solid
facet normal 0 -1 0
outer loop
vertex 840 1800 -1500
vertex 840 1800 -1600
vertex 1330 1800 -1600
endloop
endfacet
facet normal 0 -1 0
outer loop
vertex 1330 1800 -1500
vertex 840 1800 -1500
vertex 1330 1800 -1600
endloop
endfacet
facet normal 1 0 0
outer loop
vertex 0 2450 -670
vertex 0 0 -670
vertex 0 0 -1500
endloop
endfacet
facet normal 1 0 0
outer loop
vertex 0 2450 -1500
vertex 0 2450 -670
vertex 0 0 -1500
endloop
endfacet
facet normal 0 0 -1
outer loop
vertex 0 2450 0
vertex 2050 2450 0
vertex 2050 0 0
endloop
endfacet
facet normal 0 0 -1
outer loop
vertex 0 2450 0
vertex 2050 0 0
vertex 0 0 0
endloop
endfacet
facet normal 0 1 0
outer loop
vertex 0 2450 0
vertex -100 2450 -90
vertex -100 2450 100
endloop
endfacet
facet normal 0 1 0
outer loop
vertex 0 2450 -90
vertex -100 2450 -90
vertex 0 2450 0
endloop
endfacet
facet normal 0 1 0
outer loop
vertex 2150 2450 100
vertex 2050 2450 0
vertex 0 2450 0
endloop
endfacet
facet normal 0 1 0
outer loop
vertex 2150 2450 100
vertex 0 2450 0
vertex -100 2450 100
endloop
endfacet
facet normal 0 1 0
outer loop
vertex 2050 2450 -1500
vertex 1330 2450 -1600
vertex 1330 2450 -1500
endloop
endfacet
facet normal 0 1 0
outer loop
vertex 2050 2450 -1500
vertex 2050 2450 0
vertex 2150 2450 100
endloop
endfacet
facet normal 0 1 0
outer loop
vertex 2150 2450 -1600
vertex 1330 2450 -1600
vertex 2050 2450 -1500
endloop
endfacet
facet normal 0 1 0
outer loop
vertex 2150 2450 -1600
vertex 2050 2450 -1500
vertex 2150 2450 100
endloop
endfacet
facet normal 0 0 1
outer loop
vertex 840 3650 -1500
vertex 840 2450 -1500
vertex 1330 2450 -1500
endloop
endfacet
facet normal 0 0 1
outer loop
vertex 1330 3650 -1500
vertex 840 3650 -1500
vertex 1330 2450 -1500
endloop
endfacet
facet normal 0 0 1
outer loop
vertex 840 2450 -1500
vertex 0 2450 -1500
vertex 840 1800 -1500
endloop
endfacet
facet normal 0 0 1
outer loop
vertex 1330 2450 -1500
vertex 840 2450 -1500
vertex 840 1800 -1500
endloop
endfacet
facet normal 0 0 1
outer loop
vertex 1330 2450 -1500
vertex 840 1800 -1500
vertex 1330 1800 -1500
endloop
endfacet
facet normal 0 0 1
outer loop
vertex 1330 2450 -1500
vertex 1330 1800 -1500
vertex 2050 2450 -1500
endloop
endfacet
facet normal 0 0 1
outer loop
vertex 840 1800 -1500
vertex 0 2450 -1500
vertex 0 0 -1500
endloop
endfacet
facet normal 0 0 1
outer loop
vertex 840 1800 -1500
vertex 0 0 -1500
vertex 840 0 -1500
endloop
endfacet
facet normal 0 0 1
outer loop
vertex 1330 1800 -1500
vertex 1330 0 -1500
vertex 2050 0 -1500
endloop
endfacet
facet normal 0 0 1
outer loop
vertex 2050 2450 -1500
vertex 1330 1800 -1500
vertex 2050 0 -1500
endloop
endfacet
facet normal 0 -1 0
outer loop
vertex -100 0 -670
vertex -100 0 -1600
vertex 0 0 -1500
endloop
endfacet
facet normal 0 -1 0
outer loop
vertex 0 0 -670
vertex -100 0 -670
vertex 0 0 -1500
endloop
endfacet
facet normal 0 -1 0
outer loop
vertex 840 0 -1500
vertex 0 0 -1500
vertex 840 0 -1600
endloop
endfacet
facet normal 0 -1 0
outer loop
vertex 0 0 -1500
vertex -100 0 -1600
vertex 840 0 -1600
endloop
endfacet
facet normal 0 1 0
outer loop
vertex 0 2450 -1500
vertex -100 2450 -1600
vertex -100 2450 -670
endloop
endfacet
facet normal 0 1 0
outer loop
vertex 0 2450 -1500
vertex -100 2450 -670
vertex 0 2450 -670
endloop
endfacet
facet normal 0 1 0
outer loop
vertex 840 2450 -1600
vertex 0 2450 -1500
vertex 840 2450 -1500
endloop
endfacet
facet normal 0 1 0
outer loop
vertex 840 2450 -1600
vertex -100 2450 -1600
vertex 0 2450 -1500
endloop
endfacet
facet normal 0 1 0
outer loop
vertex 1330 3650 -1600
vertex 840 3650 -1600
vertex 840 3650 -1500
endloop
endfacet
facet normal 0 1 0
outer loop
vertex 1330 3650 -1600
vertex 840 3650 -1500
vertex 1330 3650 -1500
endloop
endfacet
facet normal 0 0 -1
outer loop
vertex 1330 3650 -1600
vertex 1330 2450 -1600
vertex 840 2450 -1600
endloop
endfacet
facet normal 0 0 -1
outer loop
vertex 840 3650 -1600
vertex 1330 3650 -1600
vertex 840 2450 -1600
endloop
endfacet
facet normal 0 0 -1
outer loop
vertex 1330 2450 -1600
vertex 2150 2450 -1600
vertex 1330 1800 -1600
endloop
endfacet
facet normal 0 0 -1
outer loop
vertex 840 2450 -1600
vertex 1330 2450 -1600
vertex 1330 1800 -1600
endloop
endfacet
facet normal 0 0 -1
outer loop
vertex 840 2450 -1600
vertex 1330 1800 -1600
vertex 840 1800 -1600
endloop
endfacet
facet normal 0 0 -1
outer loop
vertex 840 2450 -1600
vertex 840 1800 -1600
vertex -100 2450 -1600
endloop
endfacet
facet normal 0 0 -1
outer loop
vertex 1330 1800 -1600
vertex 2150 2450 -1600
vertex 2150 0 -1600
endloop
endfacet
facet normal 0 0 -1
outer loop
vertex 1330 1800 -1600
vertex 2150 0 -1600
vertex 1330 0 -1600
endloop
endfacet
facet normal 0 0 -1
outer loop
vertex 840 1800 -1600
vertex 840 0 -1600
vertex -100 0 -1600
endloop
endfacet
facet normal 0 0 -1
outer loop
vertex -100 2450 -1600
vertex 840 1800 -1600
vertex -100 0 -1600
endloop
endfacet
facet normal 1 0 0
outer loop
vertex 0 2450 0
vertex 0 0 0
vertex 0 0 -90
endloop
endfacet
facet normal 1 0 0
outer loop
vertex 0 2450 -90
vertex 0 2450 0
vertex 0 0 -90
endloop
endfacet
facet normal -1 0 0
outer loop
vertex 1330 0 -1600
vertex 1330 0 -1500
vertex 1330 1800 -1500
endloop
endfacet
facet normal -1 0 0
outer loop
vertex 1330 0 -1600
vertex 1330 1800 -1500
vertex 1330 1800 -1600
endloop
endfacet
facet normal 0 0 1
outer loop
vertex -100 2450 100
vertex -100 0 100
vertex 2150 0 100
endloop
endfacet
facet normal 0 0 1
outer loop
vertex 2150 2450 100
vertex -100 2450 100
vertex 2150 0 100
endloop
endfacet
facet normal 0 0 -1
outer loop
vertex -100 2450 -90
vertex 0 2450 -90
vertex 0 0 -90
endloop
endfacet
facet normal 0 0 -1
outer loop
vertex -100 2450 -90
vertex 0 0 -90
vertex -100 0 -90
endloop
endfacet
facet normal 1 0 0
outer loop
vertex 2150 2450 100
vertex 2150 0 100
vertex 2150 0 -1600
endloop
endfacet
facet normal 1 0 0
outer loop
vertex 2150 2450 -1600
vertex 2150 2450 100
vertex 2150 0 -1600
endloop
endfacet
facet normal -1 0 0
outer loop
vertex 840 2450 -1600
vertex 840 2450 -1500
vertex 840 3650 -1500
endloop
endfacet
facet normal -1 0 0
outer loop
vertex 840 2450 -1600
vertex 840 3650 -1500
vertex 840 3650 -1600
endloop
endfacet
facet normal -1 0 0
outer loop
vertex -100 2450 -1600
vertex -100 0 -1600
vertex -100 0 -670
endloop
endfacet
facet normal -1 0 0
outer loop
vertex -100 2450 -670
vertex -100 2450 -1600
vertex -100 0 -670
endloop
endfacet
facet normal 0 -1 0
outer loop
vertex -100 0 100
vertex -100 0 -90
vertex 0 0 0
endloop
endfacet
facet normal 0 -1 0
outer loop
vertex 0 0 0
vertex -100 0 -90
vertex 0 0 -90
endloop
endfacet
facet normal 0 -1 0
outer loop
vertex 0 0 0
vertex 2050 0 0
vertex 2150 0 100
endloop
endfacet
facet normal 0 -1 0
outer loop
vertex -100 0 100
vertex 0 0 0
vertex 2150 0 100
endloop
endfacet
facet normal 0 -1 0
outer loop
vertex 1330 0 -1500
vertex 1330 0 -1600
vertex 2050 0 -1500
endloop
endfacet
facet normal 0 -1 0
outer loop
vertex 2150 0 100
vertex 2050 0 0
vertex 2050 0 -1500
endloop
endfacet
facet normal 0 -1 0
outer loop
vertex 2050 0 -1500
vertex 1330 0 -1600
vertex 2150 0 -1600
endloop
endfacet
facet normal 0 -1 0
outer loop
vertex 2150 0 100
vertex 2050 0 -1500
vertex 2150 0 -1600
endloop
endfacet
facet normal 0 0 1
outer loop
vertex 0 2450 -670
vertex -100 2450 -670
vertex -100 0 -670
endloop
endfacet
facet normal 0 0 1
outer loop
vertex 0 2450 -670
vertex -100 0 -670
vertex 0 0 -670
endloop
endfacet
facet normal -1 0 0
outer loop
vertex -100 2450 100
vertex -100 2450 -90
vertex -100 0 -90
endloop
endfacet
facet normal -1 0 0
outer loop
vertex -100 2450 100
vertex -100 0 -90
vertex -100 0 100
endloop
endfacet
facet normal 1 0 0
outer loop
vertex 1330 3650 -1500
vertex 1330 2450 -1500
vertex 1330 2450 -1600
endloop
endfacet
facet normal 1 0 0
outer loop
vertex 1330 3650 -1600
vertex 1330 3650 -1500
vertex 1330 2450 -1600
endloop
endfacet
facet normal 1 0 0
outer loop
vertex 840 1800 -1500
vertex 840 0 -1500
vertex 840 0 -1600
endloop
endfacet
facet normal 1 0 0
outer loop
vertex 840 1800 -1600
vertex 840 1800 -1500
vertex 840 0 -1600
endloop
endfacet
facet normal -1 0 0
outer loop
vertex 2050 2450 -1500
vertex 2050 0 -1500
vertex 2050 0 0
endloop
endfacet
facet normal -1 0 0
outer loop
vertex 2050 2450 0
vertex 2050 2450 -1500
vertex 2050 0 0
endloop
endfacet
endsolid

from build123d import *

# Parameters (mm, degrees)
SKETCH1_W           = 300
SKETCH1_H           = 50
SKETCH1_W_2         = 490
SKETCH1_H_2         = 100
BOSS_EXTRUDE2_DEPTH = 2450
BOSS_EXTRUDE3_START = 1200
SKETCH1_5_W         = 490
SKETCH1_5_H         = 100
BOSS_EXTRUDE3_DEPTH = 2450
SKETCH1_6_W         = 490
SKETCH1_6_H         = 100
CUT_EXTRUDE1_DEPTH  = 1800


with BuildPart() as part:
    # Sketch1 → Boss-Extrude2 (new body)
    with BuildSketch(Plane(origin=(0, 0, 0), x_dir=(1, 0, 0), z_dir=(0, 1, 0))):
        Polygon((780, 1500), (840, 1500), (840, 1600), (-100, 1600), (-100, 670), (0, 670), (0, 1030), (0, 1500), align=None)
        Polygon((1330, 1500), (1360, 1500), (2050, 1500), (2050, 0), (1360, 0), (1160, 0), (1160, -50), (860, -50), (560, -50), (560, 0), (0, 0), (0, 90), (-100, 90), (-100, -100), (2150, -100), (2150, 1600), (1330, 1600), align=None)
        with Locations((1010, -25)):
            Rectangle(SKETCH1_W, SKETCH1_H)
        with Locations((710, -25)):
            Rectangle(SKETCH1_W, SKETCH1_H)
        with Locations((1085, 1550)):
            Rectangle(SKETCH1_W_2, SKETCH1_H_2)
    extrude(amount=BOSS_EXTRUDE2_DEPTH)

    # Sketch1<5> → Boss-Extrude3 (add)
    with BuildSketch(Plane(origin=(0, 0, 0), x_dir=(1, 0, 0), z_dir=(0, 1, 0)).offset(BOSS_EXTRUDE3_START)):
        with Locations((1085, 1550)):
            Rectangle(SKETCH1_5_W, SKETCH1_5_H)
    extrude(amount=BOSS_EXTRUDE3_DEPTH)

    # Sketch1<6> → Cut-Extrude1 (cut)
    with BuildSketch(Plane(origin=(0, 0, 0), x_dir=(1, 0, 0), z_dir=(0, 1, 0))):
        with Locations((1085, 1550)):
            Rectangle(SKETCH1_6_W, SKETCH1_6_H)
    extrude(amount=CUT_EXTRUDE1_DEPTH, mode=Mode.SUBTRACT)


solid = part.part
